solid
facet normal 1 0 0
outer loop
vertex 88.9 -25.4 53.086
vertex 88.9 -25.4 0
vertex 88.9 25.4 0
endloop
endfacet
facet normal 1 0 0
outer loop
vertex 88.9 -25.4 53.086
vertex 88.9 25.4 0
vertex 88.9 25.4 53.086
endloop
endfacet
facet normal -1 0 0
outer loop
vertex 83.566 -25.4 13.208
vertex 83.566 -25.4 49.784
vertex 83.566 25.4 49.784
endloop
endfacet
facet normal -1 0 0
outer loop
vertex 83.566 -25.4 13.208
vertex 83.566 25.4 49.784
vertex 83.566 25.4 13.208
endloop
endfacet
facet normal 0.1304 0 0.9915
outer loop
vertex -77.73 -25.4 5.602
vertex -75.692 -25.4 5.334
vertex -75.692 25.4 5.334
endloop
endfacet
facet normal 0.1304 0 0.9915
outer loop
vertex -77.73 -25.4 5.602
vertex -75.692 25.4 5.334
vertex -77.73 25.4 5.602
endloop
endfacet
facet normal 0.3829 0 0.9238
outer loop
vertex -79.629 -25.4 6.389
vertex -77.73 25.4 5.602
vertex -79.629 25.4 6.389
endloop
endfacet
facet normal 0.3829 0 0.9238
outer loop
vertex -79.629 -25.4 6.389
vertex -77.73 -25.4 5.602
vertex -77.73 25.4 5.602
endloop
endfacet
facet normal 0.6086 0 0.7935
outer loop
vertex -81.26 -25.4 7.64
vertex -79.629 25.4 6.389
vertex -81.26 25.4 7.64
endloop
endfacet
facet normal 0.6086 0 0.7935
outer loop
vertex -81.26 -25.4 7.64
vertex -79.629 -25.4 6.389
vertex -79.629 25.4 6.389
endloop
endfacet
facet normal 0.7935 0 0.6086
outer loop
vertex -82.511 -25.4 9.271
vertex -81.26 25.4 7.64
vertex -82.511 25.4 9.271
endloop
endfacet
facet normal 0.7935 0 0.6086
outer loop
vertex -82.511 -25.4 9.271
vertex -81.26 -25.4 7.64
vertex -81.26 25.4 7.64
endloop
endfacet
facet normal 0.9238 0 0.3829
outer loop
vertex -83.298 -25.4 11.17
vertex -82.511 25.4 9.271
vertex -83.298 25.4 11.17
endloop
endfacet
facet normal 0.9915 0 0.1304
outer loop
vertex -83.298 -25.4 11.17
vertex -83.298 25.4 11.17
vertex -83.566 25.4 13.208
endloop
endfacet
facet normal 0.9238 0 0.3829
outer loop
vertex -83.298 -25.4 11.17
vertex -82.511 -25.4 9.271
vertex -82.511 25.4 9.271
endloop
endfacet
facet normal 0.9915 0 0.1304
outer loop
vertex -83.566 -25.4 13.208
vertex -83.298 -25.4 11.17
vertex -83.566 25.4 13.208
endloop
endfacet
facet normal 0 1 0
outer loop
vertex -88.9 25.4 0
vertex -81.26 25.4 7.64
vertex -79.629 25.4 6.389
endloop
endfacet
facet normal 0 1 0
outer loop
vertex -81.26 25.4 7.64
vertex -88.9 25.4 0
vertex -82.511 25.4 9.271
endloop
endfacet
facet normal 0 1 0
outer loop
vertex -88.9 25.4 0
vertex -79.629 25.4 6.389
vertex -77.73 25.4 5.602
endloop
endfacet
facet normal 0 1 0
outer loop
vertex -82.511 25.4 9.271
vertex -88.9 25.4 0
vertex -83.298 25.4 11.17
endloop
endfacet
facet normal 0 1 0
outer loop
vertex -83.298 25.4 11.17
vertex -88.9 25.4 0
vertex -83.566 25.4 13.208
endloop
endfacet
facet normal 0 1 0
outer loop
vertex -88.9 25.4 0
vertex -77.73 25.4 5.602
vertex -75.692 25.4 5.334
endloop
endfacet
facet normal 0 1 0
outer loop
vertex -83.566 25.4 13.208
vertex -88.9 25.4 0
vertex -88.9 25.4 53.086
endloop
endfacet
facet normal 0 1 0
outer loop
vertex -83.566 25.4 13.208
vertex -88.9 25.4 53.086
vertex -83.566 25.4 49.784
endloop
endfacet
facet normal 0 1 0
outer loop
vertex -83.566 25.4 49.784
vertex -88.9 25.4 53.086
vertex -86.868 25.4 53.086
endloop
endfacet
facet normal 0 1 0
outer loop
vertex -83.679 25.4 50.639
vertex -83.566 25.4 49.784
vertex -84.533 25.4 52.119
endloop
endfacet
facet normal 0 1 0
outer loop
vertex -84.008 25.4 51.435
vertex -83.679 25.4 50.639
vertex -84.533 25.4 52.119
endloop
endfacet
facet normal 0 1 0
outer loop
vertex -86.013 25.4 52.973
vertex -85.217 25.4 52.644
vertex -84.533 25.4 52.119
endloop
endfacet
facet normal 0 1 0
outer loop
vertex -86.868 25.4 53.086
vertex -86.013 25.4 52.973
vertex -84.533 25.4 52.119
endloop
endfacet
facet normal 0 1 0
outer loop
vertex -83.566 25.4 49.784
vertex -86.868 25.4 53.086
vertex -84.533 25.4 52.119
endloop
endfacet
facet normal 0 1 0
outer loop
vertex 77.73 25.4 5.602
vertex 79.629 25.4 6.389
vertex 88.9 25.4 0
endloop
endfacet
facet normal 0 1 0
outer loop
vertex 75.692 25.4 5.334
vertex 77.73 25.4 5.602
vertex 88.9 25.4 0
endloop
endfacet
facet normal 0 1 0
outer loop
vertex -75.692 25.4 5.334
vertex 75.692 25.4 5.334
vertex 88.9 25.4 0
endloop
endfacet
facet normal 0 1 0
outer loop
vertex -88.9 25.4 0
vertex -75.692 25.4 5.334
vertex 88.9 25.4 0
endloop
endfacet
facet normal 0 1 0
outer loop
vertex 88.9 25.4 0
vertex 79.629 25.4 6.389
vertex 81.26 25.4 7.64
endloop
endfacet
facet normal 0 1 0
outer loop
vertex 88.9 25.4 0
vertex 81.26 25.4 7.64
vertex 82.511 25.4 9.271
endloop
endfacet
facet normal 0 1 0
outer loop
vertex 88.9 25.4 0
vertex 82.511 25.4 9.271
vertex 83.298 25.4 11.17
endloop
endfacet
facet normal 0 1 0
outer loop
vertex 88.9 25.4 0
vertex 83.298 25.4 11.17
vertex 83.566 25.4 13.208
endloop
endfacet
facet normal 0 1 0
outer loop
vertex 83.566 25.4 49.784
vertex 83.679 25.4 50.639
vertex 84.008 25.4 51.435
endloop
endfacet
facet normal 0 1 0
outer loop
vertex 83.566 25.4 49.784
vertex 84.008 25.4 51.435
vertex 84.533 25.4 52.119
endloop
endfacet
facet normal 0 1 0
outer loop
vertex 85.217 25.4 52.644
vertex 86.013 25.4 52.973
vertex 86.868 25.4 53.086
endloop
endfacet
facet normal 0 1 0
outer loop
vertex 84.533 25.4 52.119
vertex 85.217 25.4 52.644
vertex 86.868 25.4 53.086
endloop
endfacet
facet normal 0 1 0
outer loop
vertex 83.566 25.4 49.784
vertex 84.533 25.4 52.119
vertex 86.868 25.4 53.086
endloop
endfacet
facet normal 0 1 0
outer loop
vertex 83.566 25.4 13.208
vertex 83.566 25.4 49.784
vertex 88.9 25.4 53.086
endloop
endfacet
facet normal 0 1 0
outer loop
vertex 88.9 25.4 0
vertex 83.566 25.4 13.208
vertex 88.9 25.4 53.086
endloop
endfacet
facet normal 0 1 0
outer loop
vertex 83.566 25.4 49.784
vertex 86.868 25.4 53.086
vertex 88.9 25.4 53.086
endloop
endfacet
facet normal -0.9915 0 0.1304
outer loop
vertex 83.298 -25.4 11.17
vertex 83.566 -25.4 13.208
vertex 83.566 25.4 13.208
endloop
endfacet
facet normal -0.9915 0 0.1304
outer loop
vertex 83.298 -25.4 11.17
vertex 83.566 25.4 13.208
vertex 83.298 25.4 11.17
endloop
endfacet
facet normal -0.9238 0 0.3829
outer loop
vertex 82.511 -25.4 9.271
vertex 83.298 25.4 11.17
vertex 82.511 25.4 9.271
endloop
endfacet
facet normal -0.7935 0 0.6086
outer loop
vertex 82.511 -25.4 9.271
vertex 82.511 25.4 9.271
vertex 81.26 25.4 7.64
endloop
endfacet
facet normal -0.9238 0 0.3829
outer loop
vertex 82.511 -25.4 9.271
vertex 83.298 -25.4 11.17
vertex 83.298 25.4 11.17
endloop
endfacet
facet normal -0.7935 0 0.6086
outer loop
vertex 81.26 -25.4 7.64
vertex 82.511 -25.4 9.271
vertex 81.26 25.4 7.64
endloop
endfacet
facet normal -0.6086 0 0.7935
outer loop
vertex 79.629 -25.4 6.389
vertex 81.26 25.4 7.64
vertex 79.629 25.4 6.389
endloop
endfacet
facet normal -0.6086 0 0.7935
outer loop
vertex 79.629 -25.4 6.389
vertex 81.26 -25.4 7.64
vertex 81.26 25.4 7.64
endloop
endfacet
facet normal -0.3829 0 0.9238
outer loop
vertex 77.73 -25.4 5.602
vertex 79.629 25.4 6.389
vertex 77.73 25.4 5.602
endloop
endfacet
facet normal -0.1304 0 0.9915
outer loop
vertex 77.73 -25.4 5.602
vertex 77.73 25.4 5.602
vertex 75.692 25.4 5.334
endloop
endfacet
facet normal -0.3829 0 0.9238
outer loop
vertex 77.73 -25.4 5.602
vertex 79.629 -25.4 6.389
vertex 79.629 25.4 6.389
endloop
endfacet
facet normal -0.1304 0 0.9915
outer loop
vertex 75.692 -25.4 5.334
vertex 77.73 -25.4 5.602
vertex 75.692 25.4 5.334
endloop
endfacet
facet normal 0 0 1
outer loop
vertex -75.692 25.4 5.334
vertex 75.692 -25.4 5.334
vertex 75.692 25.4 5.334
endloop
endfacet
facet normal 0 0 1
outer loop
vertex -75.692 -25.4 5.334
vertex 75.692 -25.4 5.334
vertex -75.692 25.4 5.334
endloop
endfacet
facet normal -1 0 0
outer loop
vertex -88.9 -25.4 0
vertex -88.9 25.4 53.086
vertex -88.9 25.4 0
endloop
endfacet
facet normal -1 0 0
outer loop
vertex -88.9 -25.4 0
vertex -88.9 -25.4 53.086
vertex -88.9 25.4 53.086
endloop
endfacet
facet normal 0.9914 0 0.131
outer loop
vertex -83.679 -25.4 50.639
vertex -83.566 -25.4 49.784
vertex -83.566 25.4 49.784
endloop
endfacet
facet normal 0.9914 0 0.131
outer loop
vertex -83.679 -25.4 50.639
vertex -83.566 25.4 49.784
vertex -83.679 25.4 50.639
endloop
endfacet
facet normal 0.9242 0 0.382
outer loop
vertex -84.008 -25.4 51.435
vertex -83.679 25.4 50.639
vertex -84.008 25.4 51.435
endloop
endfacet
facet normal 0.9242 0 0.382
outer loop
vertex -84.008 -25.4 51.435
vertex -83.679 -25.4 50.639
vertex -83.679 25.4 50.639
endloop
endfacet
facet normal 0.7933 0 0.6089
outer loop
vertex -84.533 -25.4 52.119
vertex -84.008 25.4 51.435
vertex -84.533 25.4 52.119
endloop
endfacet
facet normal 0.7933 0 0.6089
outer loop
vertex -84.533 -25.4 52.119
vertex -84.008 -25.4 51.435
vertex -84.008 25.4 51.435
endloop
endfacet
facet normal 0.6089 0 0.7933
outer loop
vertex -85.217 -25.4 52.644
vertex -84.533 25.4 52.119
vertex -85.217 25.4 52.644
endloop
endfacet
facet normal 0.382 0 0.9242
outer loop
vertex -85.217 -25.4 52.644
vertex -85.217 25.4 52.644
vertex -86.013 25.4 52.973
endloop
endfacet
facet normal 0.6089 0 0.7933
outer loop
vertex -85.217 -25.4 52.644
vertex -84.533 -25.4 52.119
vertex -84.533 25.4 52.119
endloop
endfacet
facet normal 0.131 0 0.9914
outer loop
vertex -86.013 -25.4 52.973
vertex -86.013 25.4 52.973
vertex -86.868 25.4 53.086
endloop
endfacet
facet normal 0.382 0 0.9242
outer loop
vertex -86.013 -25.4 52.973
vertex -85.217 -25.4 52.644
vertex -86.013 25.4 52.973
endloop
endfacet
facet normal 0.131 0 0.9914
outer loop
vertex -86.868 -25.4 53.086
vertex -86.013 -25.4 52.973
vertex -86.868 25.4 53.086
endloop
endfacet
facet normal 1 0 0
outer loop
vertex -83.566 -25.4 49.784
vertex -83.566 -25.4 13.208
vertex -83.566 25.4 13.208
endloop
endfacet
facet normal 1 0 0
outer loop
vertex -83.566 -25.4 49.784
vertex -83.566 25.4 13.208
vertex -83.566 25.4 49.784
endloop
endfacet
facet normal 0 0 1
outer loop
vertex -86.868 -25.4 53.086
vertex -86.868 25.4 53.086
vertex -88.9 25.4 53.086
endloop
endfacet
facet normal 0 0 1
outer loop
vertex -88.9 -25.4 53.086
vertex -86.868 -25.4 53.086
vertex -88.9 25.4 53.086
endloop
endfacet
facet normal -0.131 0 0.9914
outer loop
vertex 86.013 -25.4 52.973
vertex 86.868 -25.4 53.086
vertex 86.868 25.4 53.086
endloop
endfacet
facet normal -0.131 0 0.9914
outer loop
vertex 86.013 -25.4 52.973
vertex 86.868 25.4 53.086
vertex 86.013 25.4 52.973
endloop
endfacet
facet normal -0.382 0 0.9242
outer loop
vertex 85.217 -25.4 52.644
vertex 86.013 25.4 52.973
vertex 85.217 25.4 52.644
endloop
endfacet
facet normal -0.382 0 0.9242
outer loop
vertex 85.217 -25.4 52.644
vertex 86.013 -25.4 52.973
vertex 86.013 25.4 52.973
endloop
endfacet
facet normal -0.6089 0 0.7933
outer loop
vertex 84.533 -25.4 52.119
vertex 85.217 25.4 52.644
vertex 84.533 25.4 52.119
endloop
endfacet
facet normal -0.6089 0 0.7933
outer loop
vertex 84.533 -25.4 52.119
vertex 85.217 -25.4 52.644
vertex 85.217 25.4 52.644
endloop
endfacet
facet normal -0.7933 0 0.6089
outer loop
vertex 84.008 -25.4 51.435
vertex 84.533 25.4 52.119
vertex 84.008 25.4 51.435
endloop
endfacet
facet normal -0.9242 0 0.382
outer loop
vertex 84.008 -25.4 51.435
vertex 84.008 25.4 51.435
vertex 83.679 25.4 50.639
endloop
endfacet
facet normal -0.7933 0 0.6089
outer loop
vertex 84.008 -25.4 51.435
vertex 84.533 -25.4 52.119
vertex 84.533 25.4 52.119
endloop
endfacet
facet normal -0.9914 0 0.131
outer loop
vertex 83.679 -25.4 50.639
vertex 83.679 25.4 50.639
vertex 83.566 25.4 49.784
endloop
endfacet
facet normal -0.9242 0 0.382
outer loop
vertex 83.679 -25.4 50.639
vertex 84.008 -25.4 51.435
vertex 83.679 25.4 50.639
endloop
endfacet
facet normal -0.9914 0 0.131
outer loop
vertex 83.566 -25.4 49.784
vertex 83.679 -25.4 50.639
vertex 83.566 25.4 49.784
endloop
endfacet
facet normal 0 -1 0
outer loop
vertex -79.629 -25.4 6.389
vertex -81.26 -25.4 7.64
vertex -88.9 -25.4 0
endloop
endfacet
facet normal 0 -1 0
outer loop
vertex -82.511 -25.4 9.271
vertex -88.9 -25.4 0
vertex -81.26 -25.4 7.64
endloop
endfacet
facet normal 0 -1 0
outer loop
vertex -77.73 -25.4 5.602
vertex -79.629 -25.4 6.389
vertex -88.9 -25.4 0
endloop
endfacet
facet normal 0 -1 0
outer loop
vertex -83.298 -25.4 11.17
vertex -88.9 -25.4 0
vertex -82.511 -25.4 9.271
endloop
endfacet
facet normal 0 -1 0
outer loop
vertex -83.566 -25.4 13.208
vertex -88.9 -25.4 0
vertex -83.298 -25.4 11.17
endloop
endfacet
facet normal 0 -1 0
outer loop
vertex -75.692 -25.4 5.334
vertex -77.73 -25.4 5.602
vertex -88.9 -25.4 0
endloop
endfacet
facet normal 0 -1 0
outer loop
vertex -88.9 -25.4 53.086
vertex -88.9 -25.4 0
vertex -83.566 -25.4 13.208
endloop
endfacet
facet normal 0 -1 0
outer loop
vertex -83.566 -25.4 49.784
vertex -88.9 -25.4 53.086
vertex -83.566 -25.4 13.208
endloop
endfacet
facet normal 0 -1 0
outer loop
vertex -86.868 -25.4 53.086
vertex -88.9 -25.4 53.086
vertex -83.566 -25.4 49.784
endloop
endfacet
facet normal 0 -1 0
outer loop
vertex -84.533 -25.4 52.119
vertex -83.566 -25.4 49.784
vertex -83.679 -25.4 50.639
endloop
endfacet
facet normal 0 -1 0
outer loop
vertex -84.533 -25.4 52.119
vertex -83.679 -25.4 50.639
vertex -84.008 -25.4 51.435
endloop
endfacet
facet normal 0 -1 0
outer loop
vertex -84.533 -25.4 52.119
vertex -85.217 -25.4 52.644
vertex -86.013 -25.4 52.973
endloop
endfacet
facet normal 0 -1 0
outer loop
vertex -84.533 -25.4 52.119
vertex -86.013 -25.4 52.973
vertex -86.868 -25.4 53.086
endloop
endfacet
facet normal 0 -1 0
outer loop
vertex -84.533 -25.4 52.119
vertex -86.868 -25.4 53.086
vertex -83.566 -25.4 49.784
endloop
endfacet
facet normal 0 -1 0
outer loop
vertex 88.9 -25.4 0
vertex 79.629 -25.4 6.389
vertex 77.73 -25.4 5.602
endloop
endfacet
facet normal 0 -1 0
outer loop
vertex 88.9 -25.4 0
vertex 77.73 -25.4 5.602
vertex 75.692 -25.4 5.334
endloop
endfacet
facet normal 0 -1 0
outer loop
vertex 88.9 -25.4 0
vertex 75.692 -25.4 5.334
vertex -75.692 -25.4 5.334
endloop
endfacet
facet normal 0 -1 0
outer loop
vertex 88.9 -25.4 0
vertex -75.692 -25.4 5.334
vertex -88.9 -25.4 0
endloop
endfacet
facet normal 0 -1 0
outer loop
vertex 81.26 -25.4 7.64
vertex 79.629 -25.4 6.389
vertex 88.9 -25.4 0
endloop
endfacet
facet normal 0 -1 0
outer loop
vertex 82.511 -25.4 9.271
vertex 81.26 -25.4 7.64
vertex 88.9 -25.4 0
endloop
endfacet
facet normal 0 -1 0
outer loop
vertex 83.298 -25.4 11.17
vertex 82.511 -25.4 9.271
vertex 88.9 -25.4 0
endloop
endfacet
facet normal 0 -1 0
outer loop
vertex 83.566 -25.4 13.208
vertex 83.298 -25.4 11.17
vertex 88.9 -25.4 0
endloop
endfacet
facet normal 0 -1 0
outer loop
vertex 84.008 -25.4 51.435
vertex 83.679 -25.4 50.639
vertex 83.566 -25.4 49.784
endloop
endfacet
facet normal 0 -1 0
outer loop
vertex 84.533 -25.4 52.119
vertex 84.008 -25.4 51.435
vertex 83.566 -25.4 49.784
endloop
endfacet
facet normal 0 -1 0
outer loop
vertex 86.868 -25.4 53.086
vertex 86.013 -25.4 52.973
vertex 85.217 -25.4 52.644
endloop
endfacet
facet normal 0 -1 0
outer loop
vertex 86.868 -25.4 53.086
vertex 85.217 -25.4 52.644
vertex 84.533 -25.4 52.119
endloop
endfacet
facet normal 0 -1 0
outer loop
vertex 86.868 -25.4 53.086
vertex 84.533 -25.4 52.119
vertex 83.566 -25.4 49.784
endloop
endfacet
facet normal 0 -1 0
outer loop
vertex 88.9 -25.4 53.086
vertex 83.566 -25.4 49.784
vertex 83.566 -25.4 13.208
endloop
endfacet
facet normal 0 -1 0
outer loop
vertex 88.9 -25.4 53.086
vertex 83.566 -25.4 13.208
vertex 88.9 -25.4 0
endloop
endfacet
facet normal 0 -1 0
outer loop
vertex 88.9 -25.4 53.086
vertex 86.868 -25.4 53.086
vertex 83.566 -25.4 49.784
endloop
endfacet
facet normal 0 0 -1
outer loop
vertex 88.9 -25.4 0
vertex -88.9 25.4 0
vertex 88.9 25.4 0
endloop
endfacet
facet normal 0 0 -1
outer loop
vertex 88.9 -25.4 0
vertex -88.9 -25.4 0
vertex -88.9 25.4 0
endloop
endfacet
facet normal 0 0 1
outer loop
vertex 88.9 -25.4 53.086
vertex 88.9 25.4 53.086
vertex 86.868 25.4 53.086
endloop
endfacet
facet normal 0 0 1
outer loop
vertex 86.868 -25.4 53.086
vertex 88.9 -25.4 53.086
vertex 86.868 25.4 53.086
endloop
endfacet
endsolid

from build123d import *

# Parameters (mm, degrees)
F1_DEPTH = 25.4


with BuildPart() as f1:
    # F0 (on Front) → F1 (new body, symmetric)
    with BuildSketch(Plane.XZ):
        with BuildLine():
            Line((-88.9, 0), (0, 0))
            Line((0, 0), (88.9, 0))
            Line((88.9, 0), (88.9, 53.086))
            Line((88.9, 53.086), (86.868, 53.086))
            ThreePointArc((86.868, 53.086), (84.533133, 52.118867), (83.566, 49.784))
            Line((83.566, 49.784), (83.566, 13.208))
            ThreePointArc((83.566, 13.208), (81.259759, 7.640241), (75.692, 5.334))
            Line((75.692, 5.334), (-75.692, 5.334))
            ThreePointArc((-75.692, 5.334), (-81.259759, 7.640241), (-83.566, 13.208))
            Line((-83.566, 13.208), (-83.566, 49.784))
            ThreePointArc((-83.566, 49.784), (-84.533133, 52.118867), (-86.868, 53.086))
            Line((-86.868, 53.086), (-88.9, 53.086))
            Line((-88.9, 53.086), (-88.9, 0))
        make_face()
    extrude(amount=F1_DEPTH, both=True)


solid = f1.part
